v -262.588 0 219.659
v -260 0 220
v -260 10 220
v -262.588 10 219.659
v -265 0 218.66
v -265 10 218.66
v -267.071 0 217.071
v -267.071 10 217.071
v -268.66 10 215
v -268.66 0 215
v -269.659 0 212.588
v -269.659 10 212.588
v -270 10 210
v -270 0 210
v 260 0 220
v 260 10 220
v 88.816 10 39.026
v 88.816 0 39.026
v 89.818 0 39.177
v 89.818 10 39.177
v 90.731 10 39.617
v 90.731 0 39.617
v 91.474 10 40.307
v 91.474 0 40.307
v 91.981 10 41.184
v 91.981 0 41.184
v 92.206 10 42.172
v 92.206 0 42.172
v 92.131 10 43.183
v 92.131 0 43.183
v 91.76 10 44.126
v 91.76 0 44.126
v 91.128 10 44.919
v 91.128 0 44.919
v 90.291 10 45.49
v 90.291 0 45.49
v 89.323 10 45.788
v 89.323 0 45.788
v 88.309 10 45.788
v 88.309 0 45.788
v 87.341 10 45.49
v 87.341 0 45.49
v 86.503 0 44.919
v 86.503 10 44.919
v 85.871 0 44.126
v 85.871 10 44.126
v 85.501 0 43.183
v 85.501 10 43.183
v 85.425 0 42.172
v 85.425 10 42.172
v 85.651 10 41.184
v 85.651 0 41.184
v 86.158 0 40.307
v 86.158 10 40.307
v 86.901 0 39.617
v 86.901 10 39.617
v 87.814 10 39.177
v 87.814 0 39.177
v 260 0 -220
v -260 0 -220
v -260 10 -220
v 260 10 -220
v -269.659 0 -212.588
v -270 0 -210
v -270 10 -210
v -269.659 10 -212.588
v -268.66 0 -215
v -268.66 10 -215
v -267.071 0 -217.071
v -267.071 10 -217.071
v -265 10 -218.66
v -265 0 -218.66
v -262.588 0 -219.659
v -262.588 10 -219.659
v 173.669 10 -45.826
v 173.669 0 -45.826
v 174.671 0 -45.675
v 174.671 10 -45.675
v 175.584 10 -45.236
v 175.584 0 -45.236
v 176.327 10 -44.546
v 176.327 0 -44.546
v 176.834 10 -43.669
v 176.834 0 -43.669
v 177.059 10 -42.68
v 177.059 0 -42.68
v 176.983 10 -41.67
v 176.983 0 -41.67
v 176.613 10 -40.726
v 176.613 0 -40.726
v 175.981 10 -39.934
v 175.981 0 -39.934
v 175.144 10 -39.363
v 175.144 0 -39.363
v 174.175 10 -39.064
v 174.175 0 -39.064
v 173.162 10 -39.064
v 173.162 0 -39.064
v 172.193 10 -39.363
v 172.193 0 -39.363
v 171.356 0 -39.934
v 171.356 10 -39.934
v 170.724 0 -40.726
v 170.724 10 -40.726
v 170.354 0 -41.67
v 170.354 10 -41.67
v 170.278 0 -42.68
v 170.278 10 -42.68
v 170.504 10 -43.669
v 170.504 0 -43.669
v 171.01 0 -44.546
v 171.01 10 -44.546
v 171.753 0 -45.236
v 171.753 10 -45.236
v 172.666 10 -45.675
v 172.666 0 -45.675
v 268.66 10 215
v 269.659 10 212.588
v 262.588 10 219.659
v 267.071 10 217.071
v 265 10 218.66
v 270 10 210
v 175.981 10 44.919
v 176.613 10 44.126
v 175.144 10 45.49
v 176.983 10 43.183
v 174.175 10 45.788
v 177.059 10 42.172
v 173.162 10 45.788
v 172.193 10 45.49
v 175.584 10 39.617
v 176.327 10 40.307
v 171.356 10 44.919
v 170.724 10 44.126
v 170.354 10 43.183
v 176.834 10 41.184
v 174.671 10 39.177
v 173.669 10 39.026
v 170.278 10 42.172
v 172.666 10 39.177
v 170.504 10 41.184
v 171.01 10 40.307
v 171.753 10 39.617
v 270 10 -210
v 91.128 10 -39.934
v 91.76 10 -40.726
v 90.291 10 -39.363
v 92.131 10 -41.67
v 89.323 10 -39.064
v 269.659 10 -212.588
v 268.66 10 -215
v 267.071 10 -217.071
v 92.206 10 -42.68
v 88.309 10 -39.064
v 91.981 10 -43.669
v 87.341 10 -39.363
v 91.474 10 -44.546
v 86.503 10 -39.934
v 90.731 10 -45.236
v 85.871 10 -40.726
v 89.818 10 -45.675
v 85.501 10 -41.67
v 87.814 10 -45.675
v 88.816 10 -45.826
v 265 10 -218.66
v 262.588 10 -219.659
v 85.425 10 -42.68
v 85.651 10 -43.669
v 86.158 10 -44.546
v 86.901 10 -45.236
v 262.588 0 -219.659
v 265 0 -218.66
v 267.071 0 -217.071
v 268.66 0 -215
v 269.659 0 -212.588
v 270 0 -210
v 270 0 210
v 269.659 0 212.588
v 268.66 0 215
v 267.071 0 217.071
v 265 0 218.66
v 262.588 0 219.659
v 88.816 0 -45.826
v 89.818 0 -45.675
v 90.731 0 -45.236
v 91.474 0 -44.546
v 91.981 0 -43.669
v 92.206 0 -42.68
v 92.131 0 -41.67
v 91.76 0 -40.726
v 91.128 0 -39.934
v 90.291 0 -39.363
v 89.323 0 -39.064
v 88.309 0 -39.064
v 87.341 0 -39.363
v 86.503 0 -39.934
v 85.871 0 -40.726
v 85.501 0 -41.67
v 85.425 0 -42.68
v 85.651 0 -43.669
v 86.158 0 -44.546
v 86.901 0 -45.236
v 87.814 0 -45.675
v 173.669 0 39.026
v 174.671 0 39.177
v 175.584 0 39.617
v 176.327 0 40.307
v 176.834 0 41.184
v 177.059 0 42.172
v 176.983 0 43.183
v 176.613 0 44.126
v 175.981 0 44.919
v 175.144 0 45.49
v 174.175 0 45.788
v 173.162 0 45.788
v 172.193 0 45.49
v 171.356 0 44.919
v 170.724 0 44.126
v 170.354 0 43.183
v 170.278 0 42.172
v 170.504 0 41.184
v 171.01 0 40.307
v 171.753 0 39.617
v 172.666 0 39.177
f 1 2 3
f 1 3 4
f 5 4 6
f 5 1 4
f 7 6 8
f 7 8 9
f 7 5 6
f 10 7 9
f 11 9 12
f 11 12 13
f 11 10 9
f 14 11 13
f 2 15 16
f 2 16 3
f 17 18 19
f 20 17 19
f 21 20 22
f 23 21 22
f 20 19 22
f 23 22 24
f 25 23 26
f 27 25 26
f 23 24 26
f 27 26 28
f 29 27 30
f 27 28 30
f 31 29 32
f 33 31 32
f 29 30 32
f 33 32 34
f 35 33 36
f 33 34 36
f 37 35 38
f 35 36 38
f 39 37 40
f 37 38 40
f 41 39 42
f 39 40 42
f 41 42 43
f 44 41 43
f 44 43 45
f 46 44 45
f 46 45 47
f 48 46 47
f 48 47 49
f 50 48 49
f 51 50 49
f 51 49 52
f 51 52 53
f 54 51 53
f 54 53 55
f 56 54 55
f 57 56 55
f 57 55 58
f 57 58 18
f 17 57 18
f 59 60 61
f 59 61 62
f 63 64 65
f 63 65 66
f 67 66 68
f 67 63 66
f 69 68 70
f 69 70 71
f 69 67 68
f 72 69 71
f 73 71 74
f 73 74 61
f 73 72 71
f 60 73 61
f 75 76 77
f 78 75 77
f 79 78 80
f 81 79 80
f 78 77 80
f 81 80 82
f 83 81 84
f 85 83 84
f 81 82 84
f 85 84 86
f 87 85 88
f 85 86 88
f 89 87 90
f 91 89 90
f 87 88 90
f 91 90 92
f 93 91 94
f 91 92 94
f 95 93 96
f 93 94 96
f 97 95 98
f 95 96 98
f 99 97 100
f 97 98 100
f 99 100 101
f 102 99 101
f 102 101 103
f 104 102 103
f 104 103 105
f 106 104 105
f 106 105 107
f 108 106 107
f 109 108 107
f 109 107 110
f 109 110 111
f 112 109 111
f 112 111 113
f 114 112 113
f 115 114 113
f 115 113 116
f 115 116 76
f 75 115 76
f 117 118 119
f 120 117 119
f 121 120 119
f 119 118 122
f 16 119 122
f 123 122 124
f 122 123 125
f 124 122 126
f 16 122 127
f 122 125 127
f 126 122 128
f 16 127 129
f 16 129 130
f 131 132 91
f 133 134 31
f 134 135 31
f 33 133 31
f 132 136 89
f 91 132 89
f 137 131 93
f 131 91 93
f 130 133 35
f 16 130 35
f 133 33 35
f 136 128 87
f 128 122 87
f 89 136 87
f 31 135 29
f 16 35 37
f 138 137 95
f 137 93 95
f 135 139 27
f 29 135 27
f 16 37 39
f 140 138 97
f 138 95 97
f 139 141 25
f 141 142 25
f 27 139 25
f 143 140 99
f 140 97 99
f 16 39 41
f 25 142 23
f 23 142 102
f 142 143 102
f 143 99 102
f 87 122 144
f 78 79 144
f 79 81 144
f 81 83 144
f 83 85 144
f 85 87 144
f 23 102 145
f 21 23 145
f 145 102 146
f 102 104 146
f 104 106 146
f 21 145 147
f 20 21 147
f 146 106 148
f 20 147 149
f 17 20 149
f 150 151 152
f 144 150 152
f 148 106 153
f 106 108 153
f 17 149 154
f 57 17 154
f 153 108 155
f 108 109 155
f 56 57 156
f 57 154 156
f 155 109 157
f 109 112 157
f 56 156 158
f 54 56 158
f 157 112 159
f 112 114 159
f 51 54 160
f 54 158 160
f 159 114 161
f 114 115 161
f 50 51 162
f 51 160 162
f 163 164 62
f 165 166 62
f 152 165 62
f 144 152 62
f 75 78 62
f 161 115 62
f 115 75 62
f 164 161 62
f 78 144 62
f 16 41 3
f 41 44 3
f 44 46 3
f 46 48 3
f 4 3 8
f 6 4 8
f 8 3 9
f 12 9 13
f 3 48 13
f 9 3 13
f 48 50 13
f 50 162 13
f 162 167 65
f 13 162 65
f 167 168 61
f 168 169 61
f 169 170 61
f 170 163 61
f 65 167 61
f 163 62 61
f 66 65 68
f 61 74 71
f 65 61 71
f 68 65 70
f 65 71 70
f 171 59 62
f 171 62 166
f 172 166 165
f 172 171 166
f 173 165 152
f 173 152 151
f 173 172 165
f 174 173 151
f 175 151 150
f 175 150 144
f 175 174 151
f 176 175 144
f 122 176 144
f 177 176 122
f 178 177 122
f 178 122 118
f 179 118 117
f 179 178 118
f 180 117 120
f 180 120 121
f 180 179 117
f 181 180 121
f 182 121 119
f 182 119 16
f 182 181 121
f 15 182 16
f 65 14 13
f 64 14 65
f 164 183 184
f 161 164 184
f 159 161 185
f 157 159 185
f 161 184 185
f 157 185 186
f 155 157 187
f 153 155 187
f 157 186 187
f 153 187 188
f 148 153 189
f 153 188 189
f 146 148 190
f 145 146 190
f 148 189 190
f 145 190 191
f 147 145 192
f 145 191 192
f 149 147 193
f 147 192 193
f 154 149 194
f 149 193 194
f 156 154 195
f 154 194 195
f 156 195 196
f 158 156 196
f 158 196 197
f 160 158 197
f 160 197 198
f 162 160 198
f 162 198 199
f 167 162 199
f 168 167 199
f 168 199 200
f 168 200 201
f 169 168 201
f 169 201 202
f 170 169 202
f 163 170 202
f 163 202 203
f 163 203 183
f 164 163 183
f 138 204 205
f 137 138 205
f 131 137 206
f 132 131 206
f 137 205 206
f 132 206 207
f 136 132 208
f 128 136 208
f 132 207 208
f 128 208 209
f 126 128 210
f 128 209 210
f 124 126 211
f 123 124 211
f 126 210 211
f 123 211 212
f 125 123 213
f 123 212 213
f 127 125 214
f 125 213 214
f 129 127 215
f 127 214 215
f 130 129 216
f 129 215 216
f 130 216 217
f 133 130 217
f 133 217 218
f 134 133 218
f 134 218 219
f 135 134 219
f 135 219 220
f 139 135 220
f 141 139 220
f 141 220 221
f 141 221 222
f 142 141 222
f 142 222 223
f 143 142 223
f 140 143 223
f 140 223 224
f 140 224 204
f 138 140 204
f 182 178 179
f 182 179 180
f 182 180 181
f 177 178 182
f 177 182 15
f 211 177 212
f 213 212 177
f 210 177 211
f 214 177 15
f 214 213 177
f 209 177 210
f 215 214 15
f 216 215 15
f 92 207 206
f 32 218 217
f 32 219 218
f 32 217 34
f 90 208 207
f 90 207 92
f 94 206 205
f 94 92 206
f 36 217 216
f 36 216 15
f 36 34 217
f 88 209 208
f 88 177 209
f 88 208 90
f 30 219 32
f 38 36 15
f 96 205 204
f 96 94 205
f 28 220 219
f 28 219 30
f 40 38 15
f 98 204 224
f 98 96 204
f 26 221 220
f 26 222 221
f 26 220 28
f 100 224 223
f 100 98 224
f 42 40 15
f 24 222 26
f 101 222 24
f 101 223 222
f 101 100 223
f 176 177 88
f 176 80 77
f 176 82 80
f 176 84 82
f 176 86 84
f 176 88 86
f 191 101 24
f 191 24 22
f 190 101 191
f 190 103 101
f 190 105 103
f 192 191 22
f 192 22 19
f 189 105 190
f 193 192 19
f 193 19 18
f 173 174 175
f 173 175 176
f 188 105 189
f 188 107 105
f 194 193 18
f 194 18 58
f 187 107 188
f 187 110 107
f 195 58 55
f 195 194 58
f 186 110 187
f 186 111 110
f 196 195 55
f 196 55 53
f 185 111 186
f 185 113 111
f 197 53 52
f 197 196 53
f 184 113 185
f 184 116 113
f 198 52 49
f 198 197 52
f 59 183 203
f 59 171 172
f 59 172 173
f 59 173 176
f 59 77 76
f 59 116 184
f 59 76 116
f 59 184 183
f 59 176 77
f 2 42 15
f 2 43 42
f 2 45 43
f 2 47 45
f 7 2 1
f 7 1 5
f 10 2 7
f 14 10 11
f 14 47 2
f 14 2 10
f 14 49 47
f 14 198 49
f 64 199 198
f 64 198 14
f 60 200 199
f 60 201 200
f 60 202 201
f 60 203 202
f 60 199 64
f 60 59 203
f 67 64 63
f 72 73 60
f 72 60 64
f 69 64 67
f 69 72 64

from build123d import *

# Parameters (mm, degrees)
EXTRUDE1_DEPTH        = 10
M8_TAPPED_HOLE1_D     = 6.8
M8_TAPPED_HOLE1_DEPTH = 19.75
M8_TAPPED_HOLE1_TIP   = 2.042926105


with BuildPart() as part:
    # Sketch1 → Extrude1 (new body)
    with BuildSketch(Plane(origin=(0, 0, 0), x_dir=(1, 0, 0), z_dir=(0, 1, 0))):
        with BuildLine():
            Line((260, -220), (-260, -220))
            ThreePointArc((-260, -220), (-267.071067812, -217.071067812), (-270, -210))
            Line((-270, -210), (-270, 210))
            ThreePointArc((-270, 210), (-267.071067812, 217.071067812), (-260, 220))
            Line((-260, 220), (260, 220))
            ThreePointArc((260, 220), (267.071067812, 217.071067812), (270, 210))
            Line((270, 210), (270, -210))
            ThreePointArc((270, -210), (267.071067812, -217.071067812), (260, -220))
        make_face()
    extrude(amount=EXTRUDE1_DEPTH)

    # M8 Tapped Hole1
    with Locations(Plane(origin=(88.815798741, 10, -42.426406871), x_dir=(0, 0, 1), z_dir=(0, 1, 0))):
        with Locations((0, 0), (84.852813742, 0), (84.852813742, 84.852813742), (0, 84.852813742)):
            Hole(M8_TAPPED_HOLE1_D / 2, depth=M8_TAPPED_HOLE1_DEPTH)
            with Locations((0, 0, -(M8_TAPPED_HOLE1_DEPTH + M8_TAPPED_HOLE1_TIP / 2))):  # 118° drill point
                Cone(0, M8_TAPPED_HOLE1_D / 2, M8_TAPPED_HOLE1_TIP, mode=Mode.SUBTRACT)


solid = part.part
